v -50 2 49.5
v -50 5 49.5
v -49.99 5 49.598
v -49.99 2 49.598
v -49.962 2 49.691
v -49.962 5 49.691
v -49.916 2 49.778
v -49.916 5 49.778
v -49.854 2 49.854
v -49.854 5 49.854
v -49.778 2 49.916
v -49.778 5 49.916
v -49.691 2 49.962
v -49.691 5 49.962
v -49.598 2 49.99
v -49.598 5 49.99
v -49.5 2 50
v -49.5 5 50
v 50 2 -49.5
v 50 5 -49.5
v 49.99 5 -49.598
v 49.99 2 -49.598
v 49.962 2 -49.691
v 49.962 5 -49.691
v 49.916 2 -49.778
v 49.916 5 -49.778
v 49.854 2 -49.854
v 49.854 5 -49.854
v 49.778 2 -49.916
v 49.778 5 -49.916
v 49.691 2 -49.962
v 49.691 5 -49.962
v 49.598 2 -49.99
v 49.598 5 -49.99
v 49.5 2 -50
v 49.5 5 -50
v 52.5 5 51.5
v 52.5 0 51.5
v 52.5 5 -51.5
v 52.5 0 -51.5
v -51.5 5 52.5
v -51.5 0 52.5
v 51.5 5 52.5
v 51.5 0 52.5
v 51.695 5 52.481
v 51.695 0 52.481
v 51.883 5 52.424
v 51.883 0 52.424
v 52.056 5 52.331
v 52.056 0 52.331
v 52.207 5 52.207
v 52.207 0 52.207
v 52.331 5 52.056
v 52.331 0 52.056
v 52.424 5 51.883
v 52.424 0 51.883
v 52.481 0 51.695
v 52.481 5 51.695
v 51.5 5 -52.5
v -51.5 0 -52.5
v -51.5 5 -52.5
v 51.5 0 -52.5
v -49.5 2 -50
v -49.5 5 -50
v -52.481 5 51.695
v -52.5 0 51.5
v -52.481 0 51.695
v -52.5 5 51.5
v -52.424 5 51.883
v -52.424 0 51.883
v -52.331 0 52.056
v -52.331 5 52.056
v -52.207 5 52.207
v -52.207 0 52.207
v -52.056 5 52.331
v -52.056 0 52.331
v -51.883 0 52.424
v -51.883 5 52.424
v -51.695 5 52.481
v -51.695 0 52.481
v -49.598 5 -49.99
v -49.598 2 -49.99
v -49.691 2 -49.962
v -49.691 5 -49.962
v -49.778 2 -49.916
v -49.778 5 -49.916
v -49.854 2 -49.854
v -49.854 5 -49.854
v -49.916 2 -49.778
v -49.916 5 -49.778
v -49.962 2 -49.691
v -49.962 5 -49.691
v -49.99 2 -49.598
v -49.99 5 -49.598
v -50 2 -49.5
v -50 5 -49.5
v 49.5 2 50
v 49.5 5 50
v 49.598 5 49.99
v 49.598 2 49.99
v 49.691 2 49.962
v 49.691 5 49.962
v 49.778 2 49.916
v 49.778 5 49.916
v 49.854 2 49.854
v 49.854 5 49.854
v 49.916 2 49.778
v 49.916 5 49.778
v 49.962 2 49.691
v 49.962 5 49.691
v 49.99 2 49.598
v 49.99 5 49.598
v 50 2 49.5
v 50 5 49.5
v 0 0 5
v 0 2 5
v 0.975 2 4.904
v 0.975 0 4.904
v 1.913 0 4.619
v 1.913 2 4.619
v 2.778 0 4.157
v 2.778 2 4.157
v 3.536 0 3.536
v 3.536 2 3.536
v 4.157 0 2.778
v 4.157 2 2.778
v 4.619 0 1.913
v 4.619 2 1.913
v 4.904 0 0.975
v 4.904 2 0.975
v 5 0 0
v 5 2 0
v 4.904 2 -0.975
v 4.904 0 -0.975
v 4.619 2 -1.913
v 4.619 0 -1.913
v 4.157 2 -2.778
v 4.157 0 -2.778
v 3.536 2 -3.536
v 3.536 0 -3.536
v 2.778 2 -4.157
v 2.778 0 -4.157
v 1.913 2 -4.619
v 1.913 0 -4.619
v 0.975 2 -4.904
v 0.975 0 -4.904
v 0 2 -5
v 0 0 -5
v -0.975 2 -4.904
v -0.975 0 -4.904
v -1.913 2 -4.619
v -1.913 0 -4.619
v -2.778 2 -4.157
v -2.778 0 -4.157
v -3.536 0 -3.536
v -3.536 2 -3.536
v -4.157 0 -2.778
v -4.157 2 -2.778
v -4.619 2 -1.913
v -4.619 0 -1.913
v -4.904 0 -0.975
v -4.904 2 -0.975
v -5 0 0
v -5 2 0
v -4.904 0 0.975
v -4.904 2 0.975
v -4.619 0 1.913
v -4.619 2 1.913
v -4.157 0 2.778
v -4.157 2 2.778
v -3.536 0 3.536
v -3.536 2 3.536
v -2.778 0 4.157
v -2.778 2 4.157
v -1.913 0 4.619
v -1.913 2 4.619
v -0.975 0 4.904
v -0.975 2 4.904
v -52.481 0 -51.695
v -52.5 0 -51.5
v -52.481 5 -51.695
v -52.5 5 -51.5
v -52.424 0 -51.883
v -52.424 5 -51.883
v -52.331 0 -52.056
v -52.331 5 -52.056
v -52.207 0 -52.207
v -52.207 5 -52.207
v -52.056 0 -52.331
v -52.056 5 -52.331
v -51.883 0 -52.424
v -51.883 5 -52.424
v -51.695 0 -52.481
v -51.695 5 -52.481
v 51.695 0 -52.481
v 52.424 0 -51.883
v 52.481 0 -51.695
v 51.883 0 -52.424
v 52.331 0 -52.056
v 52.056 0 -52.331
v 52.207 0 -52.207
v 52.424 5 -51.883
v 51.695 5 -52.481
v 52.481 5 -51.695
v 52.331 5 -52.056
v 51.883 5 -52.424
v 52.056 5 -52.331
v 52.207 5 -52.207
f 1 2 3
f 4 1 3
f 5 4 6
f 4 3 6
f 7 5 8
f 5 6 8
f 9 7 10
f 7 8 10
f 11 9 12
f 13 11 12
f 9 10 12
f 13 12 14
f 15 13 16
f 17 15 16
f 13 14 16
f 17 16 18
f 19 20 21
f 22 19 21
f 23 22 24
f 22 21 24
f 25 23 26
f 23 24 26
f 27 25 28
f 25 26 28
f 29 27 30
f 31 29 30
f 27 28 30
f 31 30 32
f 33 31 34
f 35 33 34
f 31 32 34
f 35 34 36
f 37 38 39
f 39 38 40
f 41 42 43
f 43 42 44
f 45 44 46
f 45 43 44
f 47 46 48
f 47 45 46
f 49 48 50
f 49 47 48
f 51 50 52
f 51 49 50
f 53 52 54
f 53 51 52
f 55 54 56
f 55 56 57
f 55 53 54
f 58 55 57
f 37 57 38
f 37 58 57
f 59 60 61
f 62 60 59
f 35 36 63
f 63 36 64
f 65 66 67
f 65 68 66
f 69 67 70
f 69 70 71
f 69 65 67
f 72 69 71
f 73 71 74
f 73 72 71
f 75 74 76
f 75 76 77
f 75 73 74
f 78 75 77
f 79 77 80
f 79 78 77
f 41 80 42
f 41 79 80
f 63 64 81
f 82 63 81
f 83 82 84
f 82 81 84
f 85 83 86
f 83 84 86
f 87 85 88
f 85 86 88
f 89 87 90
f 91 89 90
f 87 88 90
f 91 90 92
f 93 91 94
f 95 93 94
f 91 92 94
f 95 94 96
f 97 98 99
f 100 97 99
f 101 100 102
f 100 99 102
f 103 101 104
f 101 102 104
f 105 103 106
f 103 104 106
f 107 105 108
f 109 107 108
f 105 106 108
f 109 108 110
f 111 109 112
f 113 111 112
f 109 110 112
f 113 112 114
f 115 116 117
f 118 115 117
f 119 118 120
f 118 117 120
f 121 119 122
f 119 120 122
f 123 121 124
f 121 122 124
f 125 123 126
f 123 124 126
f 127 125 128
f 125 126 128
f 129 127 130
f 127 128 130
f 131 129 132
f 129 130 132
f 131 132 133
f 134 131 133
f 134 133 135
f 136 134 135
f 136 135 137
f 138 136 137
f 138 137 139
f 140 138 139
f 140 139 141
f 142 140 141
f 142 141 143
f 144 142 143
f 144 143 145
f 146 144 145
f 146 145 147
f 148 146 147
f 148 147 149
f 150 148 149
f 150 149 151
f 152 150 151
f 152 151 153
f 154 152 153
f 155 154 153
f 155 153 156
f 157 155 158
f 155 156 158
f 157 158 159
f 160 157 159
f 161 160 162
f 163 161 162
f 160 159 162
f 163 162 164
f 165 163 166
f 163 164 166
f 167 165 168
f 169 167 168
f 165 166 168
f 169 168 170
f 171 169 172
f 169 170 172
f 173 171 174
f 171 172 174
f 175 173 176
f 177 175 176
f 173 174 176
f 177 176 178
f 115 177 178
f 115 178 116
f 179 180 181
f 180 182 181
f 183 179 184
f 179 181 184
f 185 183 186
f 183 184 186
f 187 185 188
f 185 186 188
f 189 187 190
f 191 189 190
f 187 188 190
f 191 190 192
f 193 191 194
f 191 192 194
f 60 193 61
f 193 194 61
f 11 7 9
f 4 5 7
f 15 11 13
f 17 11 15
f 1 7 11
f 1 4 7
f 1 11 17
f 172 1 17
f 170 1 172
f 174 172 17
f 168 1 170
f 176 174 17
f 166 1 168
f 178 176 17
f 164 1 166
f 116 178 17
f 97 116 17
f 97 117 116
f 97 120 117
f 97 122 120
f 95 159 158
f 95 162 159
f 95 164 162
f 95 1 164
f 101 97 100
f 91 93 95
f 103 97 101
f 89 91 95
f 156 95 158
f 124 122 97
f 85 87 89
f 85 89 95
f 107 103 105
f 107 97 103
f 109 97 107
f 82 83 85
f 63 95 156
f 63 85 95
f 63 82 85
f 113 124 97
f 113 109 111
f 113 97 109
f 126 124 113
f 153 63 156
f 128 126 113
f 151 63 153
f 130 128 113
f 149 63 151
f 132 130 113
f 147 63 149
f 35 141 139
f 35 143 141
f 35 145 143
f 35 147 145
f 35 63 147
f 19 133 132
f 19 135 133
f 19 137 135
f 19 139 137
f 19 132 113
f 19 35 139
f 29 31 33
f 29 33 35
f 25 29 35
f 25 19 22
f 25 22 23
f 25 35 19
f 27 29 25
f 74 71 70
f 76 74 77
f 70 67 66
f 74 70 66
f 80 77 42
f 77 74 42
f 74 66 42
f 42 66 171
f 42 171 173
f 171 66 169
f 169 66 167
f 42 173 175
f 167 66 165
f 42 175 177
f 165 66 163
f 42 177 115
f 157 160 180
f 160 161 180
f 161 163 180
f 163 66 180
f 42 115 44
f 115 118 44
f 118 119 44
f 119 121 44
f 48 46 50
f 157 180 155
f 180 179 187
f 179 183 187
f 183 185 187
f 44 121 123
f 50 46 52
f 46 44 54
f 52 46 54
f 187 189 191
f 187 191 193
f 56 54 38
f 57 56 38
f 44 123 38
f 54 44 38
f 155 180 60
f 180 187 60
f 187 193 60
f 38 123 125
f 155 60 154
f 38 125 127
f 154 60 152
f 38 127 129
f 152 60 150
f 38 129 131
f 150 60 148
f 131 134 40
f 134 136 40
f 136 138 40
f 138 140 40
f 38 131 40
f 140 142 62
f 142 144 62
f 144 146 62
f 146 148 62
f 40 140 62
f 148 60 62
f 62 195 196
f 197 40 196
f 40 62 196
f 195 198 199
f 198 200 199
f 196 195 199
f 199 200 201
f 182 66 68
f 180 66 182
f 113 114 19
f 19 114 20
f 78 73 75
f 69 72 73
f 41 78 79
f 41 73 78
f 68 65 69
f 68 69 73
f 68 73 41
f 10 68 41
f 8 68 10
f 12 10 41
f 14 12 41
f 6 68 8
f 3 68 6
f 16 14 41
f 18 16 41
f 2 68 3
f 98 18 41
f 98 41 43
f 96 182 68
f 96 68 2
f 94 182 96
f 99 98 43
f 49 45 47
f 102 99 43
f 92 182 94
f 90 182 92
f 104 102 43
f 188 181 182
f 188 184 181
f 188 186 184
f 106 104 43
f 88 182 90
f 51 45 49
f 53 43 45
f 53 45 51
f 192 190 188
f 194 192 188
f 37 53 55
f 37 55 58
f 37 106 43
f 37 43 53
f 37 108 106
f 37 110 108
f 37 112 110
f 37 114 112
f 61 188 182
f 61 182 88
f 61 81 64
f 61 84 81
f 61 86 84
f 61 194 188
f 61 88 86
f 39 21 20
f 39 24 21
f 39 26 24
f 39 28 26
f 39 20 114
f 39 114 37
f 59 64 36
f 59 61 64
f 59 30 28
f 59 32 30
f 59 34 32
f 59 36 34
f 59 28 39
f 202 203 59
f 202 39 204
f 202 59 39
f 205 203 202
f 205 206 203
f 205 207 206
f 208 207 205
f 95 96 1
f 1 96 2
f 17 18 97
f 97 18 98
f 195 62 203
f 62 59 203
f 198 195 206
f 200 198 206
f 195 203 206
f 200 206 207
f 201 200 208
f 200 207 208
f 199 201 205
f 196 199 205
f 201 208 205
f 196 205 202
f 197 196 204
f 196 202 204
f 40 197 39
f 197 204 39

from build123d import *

# Parameters (mm, degrees)
SKETCH1_W           = 105
SKETCH1_H           = 105
BOSS_EXTRUDE1_DEPTH = 5
SKETCH2_R           = 5
CUT_EXTRUDE1_DEPTH  = 5
CUT_EXTRUDE2_DEPTH  = 3
FILLET1_R           = 1


with BuildPart() as part:
    # Sketch1 → Boss-Extrude1 (new body)
    with BuildSketch(Plane(origin=(0, 0, 0), x_dir=(1, 0, 0), z_dir=(0, 1, 0))):
        Rectangle(SKETCH1_W, SKETCH1_H)
    extrude(amount=BOSS_EXTRUDE1_DEPTH)

    # Sketch2 → Cut-Extrude1 (cut)
    with BuildSketch(Plane(origin=(0, 5, 0), x_dir=(1, 0, 0), z_dir=(0, 1, 0))):
        with Locations(Location((0, 0, 0), (0, 0, 270))):
            Circle(SKETCH2_R)
    extrude(amount=-CUT_EXTRUDE1_DEPTH, mode=Mode.SUBTRACT)

    # Sketch3 → Cut-Extrude2 (cut)
    with BuildSketch(Plane(origin=(0, 5, 0), x_dir=(1, 0, 0), z_dir=(0, 1, 0))):
        with BuildLine():
            Line((-49.5, -50), (49.5, -50))
            ThreePointArc((49.5, -50), (49.853553391, -49.853553391), (50, -49.5))
            Line((50, -49.5), (50, 49.5))
            ThreePointArc((50, 49.5), (49.853553391, 49.853553391), (49.5, 50))
            Line((49.5, 50), (-49.5, 50))
            ThreePointArc((-49.5, 50), (-49.853553391, 49.853553391), (-50, 49.5))
            Line((-50, 49.5), (-50, -49.5))
            ThreePointArc((-50, -49.5), (-49.853553391, -49.853553391), (-49.5, -50))
        make_face()
    extrude(amount=-CUT_EXTRUDE2_DEPTH, mode=Mode.SUBTRACT)

    # Fillet1
    fillet1_edges = [part.edges().sort_by_distance(p)[0] for p in [
        (52.5, 2.5, 52.5),
        (-52.5, 2.5, 52.5),
        (-52.5, 2.5, -52.5),
        (52.5, 2.5, -52.5),
    ]]
    fillet(fillet1_edges, radius=FILLET1_R)


solid = part.part
